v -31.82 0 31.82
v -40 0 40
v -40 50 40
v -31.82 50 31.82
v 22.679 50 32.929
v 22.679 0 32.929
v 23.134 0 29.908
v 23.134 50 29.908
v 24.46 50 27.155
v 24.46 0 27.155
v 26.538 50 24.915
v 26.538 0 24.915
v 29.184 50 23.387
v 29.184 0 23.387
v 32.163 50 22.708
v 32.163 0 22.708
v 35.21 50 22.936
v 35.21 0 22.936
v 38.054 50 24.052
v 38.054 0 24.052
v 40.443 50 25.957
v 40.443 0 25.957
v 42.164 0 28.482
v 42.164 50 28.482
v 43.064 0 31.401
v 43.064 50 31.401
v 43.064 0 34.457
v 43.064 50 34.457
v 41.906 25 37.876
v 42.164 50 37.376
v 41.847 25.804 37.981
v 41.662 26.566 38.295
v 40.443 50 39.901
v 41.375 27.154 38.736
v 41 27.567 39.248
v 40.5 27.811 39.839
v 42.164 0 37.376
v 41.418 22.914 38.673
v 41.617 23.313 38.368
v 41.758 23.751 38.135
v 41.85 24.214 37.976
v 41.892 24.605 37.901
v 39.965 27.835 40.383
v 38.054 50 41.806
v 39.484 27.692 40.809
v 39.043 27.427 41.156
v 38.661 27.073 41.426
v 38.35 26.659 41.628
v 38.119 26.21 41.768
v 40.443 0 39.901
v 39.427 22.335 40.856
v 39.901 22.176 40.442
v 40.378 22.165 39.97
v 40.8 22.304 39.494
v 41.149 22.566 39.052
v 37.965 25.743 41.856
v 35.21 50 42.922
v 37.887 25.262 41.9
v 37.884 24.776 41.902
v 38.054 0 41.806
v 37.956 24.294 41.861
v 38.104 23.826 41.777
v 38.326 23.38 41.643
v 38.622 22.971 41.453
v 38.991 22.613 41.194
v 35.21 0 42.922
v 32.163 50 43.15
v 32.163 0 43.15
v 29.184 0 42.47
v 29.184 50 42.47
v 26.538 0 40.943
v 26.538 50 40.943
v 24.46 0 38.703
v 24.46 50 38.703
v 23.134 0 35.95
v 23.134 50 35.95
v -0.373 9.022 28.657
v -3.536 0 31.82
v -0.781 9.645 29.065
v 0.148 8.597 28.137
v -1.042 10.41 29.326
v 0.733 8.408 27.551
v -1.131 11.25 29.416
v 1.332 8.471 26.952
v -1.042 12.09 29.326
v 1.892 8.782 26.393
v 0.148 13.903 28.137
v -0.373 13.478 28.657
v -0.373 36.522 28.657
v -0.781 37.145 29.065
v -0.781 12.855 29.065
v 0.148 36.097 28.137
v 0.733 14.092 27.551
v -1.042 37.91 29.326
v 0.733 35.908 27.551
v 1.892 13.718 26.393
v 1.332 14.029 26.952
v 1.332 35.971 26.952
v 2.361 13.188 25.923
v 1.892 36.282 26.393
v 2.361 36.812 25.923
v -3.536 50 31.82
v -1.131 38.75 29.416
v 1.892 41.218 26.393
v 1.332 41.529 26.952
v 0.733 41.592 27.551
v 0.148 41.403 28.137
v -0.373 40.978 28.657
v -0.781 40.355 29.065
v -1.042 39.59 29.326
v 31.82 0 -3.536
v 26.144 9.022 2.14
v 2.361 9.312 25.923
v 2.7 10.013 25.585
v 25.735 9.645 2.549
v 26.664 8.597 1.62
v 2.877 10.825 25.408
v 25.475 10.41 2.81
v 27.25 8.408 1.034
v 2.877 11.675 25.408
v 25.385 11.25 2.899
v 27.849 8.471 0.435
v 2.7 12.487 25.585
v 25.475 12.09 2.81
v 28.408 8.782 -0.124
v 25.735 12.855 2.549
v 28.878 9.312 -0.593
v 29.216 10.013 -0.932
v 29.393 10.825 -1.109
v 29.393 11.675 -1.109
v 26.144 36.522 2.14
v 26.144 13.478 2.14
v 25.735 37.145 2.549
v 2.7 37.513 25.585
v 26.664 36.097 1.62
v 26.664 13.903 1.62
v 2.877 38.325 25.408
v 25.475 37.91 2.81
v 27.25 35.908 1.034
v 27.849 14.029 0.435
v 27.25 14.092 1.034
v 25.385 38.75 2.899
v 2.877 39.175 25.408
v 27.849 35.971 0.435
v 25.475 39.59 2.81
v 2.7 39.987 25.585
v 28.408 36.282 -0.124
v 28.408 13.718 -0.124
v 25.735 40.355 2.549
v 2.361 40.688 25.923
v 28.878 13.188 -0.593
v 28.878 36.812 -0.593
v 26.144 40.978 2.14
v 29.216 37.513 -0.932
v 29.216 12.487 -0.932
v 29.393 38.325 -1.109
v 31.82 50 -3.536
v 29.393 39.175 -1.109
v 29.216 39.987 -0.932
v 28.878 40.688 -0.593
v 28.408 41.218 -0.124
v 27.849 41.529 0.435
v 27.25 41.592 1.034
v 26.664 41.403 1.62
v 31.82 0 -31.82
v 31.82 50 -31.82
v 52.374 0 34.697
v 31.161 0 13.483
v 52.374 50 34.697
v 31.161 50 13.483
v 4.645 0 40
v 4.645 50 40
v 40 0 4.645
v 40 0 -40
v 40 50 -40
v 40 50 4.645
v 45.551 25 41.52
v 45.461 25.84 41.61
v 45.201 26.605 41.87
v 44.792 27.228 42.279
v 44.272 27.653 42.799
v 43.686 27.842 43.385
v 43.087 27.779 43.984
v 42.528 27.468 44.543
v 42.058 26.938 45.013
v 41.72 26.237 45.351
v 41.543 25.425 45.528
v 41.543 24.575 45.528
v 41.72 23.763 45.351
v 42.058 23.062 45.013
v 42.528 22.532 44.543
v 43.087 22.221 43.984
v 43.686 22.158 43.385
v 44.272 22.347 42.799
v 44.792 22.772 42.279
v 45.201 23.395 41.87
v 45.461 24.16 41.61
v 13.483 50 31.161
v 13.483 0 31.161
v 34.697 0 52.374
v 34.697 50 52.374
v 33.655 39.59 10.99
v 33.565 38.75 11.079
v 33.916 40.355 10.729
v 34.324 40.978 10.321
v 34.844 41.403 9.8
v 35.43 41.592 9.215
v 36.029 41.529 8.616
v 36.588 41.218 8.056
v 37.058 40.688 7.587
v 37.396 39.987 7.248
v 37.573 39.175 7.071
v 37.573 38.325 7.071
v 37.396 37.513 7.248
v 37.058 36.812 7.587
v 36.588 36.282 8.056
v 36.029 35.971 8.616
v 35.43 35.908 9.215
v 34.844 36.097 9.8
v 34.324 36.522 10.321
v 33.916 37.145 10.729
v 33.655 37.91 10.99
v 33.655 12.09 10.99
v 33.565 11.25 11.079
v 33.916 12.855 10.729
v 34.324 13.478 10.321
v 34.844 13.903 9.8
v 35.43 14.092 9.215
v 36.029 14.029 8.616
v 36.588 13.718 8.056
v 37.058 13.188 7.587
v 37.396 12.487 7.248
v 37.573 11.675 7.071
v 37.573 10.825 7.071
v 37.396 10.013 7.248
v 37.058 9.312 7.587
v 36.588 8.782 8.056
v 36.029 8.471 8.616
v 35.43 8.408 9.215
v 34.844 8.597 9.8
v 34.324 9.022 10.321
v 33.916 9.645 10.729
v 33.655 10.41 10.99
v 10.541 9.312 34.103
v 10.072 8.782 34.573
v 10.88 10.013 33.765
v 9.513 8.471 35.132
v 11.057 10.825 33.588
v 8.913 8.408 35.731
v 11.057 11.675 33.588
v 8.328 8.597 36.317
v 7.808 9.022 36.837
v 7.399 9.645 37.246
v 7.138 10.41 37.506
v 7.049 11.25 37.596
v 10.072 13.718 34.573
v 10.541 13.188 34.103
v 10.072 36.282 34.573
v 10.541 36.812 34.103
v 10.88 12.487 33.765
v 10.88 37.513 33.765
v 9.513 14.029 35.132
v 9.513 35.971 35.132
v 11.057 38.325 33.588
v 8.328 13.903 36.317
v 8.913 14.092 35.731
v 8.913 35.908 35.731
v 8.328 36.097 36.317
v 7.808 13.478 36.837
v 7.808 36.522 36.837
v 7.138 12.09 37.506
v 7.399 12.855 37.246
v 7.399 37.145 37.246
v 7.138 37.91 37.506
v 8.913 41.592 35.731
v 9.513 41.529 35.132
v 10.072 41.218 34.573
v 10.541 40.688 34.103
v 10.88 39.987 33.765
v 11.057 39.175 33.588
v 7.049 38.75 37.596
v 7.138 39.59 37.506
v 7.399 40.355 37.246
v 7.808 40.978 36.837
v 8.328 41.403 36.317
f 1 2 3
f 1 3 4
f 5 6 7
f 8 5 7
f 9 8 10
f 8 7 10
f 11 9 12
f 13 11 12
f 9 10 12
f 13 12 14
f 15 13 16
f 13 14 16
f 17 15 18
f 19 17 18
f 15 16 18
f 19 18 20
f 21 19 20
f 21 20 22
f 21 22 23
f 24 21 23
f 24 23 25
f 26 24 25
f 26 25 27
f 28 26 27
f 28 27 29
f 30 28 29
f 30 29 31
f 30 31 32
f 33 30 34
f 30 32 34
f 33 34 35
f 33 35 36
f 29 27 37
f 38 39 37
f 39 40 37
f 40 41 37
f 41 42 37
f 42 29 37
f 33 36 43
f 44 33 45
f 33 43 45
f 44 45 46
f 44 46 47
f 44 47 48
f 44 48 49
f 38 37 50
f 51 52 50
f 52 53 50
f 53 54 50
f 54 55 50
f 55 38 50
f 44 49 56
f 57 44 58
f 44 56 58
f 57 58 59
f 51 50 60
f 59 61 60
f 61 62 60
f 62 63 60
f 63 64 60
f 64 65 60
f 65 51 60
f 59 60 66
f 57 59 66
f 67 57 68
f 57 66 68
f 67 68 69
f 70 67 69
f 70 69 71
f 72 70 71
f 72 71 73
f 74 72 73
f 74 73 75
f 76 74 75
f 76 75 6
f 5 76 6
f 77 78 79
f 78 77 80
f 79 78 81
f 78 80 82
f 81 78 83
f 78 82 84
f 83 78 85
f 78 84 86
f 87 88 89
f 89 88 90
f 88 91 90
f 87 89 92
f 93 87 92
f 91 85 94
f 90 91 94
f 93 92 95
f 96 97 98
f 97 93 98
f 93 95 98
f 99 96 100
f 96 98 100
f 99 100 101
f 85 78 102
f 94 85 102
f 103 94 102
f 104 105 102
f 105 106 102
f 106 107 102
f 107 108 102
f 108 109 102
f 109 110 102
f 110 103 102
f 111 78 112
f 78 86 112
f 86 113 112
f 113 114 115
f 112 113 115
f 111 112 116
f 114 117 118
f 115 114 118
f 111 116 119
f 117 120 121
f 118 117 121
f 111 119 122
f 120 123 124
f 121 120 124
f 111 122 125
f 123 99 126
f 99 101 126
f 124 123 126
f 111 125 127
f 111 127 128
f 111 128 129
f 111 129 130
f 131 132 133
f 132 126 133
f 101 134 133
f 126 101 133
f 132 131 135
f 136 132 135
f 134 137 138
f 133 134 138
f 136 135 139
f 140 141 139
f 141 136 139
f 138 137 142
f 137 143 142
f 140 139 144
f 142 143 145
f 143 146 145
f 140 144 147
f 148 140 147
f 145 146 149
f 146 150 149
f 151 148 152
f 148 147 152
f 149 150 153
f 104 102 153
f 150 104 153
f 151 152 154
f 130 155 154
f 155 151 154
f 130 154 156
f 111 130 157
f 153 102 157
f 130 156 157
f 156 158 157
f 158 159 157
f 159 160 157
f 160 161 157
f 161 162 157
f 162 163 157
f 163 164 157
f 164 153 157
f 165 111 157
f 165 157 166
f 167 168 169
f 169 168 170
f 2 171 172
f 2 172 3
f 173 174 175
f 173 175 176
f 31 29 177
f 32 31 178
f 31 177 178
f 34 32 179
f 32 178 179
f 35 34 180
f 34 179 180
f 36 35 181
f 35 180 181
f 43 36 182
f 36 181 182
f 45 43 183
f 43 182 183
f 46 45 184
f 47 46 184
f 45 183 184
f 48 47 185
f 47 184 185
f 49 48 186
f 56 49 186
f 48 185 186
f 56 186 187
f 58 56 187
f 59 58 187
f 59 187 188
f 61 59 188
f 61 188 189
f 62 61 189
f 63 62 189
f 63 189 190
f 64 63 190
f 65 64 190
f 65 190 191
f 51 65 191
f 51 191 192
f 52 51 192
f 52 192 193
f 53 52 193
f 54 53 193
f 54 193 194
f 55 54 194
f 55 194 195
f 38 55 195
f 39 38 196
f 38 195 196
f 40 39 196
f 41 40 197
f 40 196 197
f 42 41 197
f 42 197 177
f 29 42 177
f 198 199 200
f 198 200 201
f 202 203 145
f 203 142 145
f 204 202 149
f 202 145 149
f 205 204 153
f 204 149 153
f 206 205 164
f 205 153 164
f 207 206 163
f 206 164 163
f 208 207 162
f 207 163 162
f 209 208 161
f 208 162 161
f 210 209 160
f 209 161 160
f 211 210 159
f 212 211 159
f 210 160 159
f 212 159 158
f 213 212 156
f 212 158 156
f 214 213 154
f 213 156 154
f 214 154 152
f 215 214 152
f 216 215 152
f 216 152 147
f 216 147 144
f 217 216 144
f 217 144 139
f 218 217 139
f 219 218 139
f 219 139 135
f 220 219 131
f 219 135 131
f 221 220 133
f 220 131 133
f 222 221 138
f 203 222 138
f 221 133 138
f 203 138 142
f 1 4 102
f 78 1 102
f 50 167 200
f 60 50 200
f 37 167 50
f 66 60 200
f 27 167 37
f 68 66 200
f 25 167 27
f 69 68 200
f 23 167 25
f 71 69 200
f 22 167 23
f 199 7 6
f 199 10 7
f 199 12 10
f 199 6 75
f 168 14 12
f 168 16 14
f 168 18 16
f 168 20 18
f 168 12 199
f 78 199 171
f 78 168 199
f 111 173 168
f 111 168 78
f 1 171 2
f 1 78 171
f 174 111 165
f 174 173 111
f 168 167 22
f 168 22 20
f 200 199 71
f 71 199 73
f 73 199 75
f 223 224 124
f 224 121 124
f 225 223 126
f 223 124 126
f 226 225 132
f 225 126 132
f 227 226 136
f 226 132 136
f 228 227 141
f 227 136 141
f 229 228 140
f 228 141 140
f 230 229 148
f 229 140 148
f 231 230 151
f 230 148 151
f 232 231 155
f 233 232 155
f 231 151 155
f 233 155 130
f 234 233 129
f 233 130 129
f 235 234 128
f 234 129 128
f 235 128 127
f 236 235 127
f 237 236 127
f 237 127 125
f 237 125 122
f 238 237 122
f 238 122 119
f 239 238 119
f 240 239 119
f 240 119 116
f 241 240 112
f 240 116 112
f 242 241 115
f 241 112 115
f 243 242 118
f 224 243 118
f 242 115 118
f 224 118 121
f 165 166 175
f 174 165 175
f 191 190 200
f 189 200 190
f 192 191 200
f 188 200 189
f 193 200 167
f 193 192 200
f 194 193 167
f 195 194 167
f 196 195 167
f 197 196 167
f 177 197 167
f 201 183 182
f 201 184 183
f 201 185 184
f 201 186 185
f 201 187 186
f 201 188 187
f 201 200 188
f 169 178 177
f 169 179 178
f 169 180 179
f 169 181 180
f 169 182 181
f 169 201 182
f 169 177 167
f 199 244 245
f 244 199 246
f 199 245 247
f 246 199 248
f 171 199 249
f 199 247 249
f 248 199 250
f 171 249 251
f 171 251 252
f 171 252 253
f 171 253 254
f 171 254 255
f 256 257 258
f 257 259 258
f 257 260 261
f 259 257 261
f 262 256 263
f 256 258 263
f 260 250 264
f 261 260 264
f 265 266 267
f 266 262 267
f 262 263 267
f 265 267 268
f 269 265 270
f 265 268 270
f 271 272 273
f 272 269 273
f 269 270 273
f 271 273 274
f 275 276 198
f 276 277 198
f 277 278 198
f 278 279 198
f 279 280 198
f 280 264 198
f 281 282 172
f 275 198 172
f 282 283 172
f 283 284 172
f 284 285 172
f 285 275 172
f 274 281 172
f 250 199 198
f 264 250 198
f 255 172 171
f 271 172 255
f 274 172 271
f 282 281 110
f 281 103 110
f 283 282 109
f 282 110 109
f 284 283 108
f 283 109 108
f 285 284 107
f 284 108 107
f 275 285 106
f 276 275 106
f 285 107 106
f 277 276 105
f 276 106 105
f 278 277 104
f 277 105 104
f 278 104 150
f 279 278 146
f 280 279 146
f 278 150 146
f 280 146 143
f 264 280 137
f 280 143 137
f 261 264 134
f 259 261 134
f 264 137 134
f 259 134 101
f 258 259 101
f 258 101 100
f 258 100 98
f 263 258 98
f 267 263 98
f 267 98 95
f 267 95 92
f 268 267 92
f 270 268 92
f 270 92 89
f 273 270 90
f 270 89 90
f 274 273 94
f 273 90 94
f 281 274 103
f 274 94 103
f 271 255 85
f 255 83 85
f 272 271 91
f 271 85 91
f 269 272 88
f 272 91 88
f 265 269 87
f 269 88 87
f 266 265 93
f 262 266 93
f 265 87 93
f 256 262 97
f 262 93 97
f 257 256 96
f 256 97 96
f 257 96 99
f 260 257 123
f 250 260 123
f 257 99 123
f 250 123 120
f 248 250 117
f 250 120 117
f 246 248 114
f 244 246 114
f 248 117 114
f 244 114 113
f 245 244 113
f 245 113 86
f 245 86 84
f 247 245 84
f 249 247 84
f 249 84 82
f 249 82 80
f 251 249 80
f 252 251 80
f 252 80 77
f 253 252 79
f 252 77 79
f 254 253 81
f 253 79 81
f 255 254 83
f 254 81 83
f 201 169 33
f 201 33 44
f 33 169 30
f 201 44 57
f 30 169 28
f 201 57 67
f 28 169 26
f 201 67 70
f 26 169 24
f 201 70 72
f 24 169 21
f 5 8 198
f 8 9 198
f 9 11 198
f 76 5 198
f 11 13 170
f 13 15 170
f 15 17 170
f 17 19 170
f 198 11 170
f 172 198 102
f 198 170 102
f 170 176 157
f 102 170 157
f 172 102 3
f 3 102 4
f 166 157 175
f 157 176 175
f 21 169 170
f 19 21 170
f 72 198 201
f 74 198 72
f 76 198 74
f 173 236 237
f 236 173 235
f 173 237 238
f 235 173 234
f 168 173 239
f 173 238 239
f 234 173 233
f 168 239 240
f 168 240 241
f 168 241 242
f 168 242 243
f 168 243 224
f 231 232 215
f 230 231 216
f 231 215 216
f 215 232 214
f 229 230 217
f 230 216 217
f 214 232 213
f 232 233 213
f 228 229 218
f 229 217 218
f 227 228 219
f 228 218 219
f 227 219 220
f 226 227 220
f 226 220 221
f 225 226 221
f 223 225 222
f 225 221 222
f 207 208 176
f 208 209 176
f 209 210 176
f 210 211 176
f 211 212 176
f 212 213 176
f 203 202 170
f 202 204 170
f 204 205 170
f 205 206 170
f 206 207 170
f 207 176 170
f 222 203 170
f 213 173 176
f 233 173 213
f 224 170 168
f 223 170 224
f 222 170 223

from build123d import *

# Parameters (mm, degrees)
BOSS_EXTRUDE1_DEPTH             = 50
CUT_EXTRUDE1_DEPTH              = 76.498344353
SKETCH5_W                       = 25
SKETCH5_H                       = 50
BOSS_EXTRUDE2_DEPTH             = 30
F_20_5_20_5_DIAMETER_HOLE1_D    = 20.5
F_5_7_5_7_DIAMETER_HOLE1_REACH  = 130.282
F_5_7_5_7_DIAMETER_HOLE1_BORE_R = 2.85
F_5_7_5_7_DIAMETER_HOLE2_D      = 5.7
F_5_7_5_7_DIAMETER_HOLE2_DEPTH  = 11.568542495
F_5_7_5_7_DIAMETER_HOLE2_TIP    = 1.712452764


with BuildPart() as part:
    # Sketch2 → Boss-Extrude1 (new body)
    with BuildSketch(Plane(origin=(0, 0, 0), x_dir=(1, 0, 0), z_dir=(0, 1, 0))):
        Polygon((-40, -40), (40, 40), (40, -40), align=None)
    extrude(amount=BOSS_EXTRUDE1_DEPTH)

    # Sketch4 → Cut-Extrude1 (cut, through all)
    with BuildSketch(Plane(origin=(0, 50, 0), x_dir=(1, 0, 0), z_dir=(0, 1, 0))):
        Polygon((17.67766953, 17.67766953), (-17.67766953, -17.67766953), (-3.535533906, -31.819805153), (31.819805153, 3.535533906), align=None)
        Polygon((31.819805153, 31.819805153), (17.67766953, 17.67766953), (31.819805153, 3.535533906), align=None)
        Polygon((-17.67766953, -17.67766953), (-31.819805153, -31.819805153), (-3.535533906, -31.819805153), align=None)
        Polygon((40, -4.644660941), (4.644660941, -40), (40, -40), align=None)
    extrude(amount=-CUT_EXTRUDE1_DEPTH, mode=Mode.SUBTRACT)

    # Sketch5 → Boss-Extrude2 (add)
    with BuildSketch(Plane(origin=(22.32233047, 0, 22.32233047), x_dir=(0.7071067811865474, 0, -0.7071067811865477), z_dir=(0.7071067811865477, 0, 0.7071067811865474))):
        with Locations((0, 25)):
            Rectangle(SKETCH5_W, SKETCH5_H)
    extrude(amount=BOSS_EXTRUDE2_DEPTH)

    # Ø20.5 (20.5) Diameter Hole1 (through all)
    with Locations(Plane(origin=(0, 50, 0), x_dir=(1, 0, 0), z_dir=(0, 1, 0))):
        with Locations((32.928932188, -32.928932188)):
            Hole(F_20_5_20_5_DIAMETER_HOLE1_D / 2)

    # Ø5.7 (5.7) Diameter Hole1 bore → Ø5.7 (5.7) Diameter Hole1 (cut, up to next)
    with BuildSketch(Plane(origin=(43.535533906, 0, 43.535533906), x_dir=(0.7071067811865476, 0, -0.7071067811865476), z_dir=(0.7071067811865476, 0, 0.7071067811865476)), mode=Mode.PRIVATE) as f_5_7_5_7_diameter_hole1_sk1:
        with Locations((0, 25)):
            Circle(F_5_7_5_7_DIAMETER_HOLE1_BORE_R)
    f_5_7_5_7_diameter_hole1_tool1 = extrude(f_5_7_5_7_diameter_hole1_sk1.sketch, amount=-F_5_7_5_7_DIAMETER_HOLE1_REACH, mode=Mode.PRIVATE) & part.part
    add(f_5_7_5_7_diameter_hole1_tool1.solids().sort_by_distance((43.535534, 25, 43.535534))[0], mode=Mode.SUBTRACT)

    # Ø5.7 (5.7) Diameter Hole2
    with Locations(Plane(origin=(22.32233047, 0, 22.32233047), x_dir=(0.7071067811865474, 0, -0.7071067811865477), z_dir=(0.7071067811865477, 0, 0.7071067811865474))):
        with Locations((-18.75, 38.75), (18.75, 38.75), (18.75, 11.25), (-18.75, 11.25)):
            Hole(F_5_7_5_7_DIAMETER_HOLE2_D / 2, depth=F_5_7_5_7_DIAMETER_HOLE2_DEPTH)
            with Locations((0, 0, -(F_5_7_5_7_DIAMETER_HOLE2_DEPTH + F_5_7_5_7_DIAMETER_HOLE2_TIP / 2))):  # 118° drill point
                Cone(0, F_5_7_5_7_DIAMETER_HOLE2_D / 2, F_5_7_5_7_DIAMETER_HOLE2_TIP, mode=Mode.SUBTRACT)


solid = part.part
